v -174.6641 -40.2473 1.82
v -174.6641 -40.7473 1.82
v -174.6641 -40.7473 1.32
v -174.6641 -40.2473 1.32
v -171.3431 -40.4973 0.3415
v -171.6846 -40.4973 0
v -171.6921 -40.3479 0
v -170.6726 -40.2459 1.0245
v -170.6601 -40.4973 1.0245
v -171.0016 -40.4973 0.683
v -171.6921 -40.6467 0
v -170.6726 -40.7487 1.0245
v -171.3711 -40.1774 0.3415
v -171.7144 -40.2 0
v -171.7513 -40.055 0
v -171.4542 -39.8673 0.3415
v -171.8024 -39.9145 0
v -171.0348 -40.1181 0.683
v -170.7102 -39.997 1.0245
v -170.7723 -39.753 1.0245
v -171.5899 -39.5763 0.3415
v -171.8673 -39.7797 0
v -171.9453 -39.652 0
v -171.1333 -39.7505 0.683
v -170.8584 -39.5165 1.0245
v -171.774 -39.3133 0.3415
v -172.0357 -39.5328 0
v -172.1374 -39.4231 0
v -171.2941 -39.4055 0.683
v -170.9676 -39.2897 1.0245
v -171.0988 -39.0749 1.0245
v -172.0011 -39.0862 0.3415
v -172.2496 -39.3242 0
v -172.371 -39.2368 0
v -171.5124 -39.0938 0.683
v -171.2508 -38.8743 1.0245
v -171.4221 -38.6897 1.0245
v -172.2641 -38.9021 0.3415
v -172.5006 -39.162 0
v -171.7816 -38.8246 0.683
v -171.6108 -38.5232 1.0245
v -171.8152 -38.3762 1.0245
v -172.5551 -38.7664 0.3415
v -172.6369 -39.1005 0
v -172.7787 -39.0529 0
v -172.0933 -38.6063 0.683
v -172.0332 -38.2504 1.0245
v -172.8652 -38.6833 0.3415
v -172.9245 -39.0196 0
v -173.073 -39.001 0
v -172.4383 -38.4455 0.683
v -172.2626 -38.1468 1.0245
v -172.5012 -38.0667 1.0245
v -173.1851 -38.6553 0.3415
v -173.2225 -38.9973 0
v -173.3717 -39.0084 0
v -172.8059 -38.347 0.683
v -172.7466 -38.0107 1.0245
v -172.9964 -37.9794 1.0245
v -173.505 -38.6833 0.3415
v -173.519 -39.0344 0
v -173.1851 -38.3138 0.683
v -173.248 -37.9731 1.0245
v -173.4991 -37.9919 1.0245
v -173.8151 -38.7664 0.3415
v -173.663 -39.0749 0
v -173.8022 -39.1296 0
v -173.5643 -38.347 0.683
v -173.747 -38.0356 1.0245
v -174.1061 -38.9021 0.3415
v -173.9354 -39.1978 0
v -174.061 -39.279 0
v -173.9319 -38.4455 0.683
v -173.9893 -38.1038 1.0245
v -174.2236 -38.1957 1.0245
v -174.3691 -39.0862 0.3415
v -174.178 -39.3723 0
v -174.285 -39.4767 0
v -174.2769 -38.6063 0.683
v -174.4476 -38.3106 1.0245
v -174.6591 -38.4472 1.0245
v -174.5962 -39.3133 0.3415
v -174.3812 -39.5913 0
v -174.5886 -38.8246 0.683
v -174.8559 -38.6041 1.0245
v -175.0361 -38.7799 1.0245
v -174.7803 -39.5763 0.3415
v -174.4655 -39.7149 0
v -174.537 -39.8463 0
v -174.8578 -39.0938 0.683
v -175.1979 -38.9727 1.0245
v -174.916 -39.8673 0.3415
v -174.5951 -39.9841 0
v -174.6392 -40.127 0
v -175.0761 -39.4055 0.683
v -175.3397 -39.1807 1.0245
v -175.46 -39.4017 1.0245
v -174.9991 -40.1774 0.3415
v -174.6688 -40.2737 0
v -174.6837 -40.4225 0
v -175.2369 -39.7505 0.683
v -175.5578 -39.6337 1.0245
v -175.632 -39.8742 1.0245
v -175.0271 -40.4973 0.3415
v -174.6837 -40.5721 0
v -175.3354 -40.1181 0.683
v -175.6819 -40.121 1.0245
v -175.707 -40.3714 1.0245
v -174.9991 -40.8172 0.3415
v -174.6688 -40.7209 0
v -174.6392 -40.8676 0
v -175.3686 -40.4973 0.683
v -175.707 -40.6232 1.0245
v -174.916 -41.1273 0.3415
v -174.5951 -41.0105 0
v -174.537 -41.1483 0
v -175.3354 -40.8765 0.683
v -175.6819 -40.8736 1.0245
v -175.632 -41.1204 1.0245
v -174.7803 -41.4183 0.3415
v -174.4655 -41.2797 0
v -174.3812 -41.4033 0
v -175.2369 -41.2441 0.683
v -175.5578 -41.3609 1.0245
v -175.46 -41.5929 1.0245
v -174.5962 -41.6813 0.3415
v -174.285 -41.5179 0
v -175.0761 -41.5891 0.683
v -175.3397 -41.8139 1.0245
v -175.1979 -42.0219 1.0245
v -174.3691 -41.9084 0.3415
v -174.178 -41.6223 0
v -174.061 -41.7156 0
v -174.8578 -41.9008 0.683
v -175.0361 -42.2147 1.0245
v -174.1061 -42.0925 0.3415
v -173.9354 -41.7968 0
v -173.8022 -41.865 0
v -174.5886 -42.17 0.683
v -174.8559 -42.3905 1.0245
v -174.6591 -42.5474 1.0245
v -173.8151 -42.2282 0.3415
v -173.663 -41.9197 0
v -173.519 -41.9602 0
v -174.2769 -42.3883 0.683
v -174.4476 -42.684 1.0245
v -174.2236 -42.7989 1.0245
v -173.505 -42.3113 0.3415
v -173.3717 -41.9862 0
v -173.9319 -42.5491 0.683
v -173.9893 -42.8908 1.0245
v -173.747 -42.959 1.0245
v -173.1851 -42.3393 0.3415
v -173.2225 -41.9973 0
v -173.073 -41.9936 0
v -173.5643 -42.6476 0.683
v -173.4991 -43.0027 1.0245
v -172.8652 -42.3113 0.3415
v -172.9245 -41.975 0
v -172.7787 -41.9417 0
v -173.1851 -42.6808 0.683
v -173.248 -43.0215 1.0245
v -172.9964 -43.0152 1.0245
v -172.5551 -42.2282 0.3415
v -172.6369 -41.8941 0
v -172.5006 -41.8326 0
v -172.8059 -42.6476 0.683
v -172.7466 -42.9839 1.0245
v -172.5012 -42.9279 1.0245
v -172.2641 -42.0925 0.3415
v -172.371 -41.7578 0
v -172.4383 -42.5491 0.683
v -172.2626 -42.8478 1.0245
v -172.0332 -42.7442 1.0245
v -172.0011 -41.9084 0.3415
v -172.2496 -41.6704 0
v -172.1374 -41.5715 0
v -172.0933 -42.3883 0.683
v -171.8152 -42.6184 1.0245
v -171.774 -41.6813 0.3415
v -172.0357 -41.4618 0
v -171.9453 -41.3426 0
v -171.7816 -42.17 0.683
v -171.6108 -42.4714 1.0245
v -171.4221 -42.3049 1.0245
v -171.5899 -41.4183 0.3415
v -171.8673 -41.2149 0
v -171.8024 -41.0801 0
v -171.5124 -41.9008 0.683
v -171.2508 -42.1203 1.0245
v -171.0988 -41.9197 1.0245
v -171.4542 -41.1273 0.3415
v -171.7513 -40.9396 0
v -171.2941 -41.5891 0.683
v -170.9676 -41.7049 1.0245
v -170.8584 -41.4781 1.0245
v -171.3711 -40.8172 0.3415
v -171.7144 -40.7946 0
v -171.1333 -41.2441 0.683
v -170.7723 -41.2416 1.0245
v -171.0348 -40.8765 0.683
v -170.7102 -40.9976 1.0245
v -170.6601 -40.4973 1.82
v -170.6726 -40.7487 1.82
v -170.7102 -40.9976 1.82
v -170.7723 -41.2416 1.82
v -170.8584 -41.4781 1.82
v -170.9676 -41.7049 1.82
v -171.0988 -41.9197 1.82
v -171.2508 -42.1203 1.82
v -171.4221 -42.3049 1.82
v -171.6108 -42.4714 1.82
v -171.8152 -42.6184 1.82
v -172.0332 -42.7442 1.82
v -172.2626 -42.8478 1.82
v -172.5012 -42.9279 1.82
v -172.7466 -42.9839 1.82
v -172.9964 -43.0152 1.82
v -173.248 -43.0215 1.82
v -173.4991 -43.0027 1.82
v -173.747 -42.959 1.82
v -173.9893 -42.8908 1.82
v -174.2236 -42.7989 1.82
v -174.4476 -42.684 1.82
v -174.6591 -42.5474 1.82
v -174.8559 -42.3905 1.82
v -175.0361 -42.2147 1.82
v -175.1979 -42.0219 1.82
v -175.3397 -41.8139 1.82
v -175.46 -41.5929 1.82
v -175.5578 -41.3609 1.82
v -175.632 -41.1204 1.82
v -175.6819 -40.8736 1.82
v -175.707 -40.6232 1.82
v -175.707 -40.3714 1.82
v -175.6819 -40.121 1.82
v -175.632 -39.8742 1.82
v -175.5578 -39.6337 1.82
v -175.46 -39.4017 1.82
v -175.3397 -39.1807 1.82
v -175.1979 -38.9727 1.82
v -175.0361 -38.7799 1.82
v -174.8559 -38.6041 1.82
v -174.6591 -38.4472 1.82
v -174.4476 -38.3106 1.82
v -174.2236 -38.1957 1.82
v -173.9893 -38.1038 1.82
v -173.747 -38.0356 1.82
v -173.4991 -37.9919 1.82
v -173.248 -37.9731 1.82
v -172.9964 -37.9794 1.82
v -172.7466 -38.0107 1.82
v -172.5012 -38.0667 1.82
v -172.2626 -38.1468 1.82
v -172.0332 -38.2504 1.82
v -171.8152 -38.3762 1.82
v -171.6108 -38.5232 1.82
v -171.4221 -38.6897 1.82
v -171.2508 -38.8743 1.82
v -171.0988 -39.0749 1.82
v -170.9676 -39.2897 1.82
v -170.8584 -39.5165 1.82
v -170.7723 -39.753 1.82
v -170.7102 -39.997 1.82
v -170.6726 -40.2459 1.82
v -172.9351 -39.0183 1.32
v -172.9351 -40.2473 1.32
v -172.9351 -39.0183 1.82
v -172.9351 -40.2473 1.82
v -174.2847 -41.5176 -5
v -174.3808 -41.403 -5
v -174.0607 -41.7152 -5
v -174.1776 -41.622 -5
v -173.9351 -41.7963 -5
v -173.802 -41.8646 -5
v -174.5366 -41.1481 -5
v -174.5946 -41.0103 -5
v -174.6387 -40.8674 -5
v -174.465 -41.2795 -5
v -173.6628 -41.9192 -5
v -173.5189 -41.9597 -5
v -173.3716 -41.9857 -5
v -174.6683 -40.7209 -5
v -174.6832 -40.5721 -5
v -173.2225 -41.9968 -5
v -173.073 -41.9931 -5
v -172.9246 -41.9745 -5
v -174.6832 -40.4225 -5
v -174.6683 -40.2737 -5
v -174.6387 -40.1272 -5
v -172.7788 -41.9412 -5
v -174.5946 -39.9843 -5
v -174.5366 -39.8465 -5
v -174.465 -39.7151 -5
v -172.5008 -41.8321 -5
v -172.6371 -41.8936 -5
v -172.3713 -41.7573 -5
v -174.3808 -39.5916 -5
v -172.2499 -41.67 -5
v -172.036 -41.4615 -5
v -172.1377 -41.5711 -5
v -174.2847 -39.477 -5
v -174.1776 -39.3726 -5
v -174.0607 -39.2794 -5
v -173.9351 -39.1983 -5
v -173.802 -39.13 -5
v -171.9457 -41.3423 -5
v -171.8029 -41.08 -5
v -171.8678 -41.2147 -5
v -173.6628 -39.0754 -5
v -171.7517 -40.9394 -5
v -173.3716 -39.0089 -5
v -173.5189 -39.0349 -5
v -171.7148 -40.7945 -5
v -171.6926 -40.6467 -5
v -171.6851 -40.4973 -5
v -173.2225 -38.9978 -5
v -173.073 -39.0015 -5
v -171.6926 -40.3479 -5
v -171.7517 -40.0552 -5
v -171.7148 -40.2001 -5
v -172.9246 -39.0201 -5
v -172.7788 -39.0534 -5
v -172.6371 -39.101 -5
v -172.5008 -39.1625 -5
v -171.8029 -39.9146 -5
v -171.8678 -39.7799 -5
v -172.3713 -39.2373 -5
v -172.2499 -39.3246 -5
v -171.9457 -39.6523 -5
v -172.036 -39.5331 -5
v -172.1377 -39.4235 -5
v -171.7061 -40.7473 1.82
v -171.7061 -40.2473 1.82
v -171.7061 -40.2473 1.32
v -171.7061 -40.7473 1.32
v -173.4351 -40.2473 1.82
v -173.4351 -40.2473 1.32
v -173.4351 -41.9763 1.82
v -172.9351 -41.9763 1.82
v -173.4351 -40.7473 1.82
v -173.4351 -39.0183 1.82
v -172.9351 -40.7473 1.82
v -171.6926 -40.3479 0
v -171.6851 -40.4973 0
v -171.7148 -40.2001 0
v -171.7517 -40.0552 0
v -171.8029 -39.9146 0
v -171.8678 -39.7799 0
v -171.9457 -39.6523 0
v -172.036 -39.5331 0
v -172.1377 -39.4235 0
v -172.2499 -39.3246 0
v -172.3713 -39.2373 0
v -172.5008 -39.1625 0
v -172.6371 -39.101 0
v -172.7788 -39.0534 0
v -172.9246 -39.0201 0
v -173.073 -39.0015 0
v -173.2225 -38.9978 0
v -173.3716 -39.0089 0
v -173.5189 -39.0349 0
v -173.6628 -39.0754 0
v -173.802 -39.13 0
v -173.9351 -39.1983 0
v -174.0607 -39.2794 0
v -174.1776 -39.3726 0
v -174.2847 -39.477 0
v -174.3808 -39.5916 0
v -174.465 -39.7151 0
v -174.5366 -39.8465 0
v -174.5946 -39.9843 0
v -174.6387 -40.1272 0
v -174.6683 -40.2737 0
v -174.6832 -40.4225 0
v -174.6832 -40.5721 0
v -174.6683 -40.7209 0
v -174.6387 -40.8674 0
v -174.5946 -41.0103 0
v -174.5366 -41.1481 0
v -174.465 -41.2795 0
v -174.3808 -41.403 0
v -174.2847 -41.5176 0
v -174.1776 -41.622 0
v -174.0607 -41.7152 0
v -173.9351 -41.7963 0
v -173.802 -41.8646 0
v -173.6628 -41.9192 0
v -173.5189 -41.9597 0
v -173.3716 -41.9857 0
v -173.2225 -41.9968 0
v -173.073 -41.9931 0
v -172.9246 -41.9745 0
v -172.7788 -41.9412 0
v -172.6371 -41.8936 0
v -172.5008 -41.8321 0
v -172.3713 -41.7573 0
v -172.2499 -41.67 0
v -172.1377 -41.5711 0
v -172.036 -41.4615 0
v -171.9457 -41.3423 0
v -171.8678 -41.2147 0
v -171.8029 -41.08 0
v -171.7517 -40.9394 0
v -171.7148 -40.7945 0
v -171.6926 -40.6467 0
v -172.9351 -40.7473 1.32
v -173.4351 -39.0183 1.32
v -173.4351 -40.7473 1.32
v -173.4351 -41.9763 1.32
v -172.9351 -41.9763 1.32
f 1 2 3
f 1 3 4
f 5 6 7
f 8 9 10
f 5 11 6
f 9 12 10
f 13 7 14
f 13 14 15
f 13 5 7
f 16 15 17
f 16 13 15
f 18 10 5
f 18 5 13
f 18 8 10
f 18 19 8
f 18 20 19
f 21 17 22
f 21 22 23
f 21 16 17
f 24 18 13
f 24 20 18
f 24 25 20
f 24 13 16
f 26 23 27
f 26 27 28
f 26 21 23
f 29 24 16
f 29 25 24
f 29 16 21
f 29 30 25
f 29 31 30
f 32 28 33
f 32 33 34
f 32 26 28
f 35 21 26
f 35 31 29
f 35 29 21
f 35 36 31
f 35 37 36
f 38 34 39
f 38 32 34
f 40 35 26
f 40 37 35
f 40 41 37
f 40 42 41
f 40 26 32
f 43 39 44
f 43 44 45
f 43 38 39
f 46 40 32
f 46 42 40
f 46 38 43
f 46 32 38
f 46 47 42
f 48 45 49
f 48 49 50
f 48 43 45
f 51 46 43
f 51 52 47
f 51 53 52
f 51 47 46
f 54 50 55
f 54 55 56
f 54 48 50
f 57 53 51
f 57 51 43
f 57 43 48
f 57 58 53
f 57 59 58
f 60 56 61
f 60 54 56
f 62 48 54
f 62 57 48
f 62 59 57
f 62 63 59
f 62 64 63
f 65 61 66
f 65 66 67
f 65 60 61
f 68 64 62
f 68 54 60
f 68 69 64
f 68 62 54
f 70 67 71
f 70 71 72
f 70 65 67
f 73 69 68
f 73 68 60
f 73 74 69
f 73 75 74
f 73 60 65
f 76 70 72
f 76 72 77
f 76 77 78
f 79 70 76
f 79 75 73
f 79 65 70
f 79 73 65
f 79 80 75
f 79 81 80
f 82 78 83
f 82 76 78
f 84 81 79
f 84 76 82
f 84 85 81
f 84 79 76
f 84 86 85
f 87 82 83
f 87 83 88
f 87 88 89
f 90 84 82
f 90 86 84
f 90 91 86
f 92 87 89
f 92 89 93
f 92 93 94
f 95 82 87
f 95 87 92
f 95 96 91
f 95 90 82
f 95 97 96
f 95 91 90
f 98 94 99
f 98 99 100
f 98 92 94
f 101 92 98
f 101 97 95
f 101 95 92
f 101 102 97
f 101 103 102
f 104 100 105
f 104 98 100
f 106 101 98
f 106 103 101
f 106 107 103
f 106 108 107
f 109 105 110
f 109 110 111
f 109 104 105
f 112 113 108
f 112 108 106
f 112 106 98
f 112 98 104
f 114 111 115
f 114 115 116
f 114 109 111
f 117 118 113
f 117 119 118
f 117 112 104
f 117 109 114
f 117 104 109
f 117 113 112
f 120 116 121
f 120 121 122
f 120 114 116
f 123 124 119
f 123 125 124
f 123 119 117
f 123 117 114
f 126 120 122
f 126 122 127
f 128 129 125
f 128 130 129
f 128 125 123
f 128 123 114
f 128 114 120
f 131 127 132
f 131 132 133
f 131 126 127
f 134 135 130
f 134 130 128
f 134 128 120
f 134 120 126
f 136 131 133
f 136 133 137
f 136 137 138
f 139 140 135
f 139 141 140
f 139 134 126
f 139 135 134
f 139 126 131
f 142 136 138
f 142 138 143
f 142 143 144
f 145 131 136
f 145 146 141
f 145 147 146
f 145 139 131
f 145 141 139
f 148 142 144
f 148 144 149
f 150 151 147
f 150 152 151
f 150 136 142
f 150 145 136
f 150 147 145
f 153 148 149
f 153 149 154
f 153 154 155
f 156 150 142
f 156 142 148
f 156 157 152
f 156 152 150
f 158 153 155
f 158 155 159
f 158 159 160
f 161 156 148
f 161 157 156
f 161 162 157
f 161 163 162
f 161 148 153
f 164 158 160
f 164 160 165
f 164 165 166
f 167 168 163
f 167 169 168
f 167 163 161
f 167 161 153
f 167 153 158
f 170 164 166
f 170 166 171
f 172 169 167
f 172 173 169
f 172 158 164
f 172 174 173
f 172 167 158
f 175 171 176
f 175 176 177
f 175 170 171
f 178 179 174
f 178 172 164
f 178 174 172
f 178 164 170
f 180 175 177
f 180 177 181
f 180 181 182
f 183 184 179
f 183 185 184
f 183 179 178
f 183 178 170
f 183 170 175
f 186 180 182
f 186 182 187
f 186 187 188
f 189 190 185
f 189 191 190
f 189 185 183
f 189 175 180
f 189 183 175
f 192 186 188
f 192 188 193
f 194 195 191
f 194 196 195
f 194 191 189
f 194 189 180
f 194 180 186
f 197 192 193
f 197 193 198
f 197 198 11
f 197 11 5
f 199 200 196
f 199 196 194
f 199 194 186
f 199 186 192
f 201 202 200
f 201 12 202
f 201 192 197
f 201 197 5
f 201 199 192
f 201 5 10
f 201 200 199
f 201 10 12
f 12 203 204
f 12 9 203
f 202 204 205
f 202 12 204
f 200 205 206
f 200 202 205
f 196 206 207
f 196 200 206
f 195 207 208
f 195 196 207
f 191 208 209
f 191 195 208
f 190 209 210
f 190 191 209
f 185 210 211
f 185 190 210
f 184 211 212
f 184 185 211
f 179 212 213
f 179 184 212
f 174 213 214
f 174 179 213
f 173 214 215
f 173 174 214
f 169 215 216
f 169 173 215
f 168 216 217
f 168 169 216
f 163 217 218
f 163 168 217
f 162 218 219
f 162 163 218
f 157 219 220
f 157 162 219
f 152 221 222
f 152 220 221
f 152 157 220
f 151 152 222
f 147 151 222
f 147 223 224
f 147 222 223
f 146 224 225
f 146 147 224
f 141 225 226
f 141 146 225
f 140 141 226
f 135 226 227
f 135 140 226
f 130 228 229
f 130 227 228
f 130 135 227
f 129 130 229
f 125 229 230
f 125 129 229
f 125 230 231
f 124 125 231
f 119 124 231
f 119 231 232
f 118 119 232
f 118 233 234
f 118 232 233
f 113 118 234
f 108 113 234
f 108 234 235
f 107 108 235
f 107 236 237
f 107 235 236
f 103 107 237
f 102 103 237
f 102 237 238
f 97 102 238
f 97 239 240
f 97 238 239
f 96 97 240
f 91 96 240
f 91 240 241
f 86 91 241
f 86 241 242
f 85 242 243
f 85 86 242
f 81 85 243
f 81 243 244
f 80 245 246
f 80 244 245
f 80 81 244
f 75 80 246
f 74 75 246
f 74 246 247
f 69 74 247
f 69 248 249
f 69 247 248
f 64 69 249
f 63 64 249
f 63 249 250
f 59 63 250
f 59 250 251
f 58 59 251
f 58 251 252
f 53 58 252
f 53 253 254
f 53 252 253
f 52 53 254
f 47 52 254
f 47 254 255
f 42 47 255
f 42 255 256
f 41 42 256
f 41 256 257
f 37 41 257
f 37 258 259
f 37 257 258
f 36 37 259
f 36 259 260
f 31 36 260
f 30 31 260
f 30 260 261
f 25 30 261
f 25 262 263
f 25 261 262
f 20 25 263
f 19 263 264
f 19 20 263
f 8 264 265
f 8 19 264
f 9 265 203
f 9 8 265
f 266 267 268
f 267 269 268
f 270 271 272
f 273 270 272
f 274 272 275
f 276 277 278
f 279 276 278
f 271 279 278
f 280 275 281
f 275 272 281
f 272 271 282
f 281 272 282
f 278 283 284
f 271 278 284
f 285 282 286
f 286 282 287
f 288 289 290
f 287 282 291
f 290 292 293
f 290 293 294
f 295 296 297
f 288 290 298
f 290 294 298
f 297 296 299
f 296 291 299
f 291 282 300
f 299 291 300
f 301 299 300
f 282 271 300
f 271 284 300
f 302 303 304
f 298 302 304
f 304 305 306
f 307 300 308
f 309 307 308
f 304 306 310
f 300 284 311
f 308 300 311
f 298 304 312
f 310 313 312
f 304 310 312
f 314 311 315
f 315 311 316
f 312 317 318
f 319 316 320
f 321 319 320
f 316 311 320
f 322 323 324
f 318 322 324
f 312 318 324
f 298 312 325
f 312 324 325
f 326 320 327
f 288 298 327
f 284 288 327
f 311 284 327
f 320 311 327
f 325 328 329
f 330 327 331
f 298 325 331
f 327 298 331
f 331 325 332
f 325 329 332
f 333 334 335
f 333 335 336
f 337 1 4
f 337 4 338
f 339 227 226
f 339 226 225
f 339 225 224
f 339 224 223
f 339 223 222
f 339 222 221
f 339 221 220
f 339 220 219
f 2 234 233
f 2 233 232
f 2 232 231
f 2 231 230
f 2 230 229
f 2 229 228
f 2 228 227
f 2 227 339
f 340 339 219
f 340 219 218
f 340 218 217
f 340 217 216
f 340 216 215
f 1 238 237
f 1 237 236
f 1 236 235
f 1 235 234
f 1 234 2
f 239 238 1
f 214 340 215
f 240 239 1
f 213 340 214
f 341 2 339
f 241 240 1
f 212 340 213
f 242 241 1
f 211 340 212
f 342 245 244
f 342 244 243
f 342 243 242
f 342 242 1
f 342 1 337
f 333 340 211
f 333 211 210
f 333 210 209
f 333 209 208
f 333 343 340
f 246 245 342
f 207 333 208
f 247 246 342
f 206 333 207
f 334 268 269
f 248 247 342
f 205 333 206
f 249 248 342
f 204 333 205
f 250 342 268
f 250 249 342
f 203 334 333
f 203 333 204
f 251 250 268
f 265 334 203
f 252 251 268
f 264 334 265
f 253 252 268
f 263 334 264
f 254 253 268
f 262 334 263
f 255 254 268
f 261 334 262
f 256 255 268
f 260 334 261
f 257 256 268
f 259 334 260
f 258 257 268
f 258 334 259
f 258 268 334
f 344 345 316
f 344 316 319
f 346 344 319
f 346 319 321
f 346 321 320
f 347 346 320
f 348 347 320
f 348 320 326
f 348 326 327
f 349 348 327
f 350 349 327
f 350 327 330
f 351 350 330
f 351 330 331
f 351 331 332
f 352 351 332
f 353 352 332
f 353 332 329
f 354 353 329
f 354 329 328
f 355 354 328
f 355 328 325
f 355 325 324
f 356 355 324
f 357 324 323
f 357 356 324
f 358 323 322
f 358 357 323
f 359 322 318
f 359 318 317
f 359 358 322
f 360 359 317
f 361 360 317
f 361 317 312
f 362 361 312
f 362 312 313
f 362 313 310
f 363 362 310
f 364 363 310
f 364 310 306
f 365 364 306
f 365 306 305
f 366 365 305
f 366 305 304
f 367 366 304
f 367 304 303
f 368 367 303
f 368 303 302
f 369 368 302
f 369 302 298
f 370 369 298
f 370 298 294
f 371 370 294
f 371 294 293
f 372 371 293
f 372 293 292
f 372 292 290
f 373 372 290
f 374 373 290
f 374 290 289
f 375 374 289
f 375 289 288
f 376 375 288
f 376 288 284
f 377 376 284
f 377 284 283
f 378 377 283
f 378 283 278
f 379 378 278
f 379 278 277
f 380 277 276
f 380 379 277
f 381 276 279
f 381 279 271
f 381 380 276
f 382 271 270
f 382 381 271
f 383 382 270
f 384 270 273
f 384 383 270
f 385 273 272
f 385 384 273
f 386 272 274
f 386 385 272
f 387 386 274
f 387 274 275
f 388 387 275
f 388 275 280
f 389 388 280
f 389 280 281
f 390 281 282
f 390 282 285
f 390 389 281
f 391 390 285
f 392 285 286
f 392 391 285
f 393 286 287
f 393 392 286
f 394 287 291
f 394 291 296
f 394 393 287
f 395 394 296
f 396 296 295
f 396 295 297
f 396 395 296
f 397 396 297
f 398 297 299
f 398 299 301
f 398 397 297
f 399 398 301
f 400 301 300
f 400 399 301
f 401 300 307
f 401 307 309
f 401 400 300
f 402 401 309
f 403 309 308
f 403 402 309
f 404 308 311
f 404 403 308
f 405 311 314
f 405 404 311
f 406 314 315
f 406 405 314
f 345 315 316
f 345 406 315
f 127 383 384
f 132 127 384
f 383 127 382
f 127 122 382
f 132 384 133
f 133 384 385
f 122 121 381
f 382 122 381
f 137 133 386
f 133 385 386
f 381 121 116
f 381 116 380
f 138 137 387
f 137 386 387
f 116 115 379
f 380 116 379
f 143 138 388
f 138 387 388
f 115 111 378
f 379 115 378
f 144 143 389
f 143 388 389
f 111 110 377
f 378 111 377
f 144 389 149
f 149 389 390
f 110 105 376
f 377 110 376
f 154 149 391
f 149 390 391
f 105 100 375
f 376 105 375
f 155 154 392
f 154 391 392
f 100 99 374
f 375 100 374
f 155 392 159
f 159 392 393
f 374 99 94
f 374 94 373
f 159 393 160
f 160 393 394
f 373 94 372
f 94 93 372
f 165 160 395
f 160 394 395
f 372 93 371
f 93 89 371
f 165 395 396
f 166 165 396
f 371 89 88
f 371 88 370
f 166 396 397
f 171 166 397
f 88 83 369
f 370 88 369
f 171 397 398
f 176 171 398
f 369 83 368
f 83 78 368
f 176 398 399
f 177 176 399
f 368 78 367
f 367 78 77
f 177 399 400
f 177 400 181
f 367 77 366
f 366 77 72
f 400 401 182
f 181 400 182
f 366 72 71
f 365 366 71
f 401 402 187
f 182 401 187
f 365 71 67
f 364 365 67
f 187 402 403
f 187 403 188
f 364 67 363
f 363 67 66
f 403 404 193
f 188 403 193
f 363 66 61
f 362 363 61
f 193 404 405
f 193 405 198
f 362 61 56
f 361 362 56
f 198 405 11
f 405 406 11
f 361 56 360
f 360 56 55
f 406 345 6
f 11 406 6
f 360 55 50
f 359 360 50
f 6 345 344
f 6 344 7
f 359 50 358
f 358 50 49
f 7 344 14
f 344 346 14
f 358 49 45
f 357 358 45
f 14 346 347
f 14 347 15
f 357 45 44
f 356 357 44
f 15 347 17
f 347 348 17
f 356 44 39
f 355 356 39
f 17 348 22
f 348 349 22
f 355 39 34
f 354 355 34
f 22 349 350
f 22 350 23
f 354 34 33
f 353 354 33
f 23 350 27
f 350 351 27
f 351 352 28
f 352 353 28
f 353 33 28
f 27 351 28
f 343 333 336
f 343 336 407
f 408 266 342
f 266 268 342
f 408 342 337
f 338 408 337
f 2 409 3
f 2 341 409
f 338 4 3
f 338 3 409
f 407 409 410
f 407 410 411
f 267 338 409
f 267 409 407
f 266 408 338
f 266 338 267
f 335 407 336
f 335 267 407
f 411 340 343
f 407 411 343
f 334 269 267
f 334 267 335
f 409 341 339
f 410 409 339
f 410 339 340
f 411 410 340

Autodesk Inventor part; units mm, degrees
sketch "Sketch1" plane through (0, 0, 0) normal (0, 0, 1) x (1, 0, 0)
  circle A0 centre (-173.1851, -40.4973) radius 1.5
  point P0 (0, 0)
  dimension "d0" = 3
extrude "Extrusion1" add sketch "Sketch1" against normal blind 5
thread "Thread1" size "M3x0.5" class "6g" standard "ANSI Metric M Profile" full length
sketch "Sketch2" plane through (-173.1851, -40.4973, 0) normal (0, 0, 1) x (1, 0, 0)
  circle A0 centre (0, 0) radius 2.525
  point P0 (173.1851, 40.4973)
  dimension "d5" = 5.05
extrude "Extrusion2" add sketch "Sketch2" along normal blind 1.82
chamfer "Chamfer1" distance 1.025 angle 45 1 edges at (-175.7101, -40.4973, 0)
sketch "Sketch3" plane through (-173.1851, -40.4973, 1.82) normal (0, 0, 1) x (1, 0, 0)
  line L0 (0, 1.5) -> (0, -1.5)
  line L1 (-1.5, 0) -> (1.5, 0)
  line L2 (-1.479, 0.25) -> (1.479, 0.25)
  line L3 (1.479, 0.25) -> (1.479, -0.25)
  line L4 (1.479, -0.25) -> (-1.479, -0.25)
  line L5 (-1.479, -0.25) -> (-1.479, 0.25)
  line L6 (-1.479, 0.25) -> (1.479, -0.25) construction
  line L7 (1.479, 0.25) -> (-1.479, -0.25) construction
  line L8 (0.25, 1.479) -> (-0.25, 1.479)
  line L9 (-0.25, 1.479) -> (-0.25, -1.479)
  line L10 (-0.25, -1.479) -> (0.25, -1.479)
  line L11 (0.25, -1.479) -> (0.25, 1.479)
  line L12 (0.25, 1.479) -> (-0.25, -1.479) construction
  line L13 (-0.25, 1.479) -> (0.25, -1.479) construction
  point P0 (173.1851, 40.4973)
  point P1 (0, 0)
  point P2 (-0.25, 0.25)
  point P3 (-0.25, -0.25)
  point P4 (0.25, -0.25)
  point P5 (0.25, 0.25)
  dimension "d12" = 0.5
  dimension "d13" = 0.5
extrude "Extrusion3" cut sketch "Sketch3" against normal blind 0.5
ref_plane "StartOfTaper" through (-173.1851, -40.4973, 1.025) normal (0, 0, -1) x (-1, 0, 0)
ref_plane "EndOfTaper" through (-173.1851, -40.4973, 0) normal (0, 0, -1) x (-1, 0, 0)
ref_plane "ThisMuchIntoBezel" through (-173.1851, -40.4973, -2.4) normal (0, 0, -1) x (-1, 0, 0)
properties part number "M3 Screw"
